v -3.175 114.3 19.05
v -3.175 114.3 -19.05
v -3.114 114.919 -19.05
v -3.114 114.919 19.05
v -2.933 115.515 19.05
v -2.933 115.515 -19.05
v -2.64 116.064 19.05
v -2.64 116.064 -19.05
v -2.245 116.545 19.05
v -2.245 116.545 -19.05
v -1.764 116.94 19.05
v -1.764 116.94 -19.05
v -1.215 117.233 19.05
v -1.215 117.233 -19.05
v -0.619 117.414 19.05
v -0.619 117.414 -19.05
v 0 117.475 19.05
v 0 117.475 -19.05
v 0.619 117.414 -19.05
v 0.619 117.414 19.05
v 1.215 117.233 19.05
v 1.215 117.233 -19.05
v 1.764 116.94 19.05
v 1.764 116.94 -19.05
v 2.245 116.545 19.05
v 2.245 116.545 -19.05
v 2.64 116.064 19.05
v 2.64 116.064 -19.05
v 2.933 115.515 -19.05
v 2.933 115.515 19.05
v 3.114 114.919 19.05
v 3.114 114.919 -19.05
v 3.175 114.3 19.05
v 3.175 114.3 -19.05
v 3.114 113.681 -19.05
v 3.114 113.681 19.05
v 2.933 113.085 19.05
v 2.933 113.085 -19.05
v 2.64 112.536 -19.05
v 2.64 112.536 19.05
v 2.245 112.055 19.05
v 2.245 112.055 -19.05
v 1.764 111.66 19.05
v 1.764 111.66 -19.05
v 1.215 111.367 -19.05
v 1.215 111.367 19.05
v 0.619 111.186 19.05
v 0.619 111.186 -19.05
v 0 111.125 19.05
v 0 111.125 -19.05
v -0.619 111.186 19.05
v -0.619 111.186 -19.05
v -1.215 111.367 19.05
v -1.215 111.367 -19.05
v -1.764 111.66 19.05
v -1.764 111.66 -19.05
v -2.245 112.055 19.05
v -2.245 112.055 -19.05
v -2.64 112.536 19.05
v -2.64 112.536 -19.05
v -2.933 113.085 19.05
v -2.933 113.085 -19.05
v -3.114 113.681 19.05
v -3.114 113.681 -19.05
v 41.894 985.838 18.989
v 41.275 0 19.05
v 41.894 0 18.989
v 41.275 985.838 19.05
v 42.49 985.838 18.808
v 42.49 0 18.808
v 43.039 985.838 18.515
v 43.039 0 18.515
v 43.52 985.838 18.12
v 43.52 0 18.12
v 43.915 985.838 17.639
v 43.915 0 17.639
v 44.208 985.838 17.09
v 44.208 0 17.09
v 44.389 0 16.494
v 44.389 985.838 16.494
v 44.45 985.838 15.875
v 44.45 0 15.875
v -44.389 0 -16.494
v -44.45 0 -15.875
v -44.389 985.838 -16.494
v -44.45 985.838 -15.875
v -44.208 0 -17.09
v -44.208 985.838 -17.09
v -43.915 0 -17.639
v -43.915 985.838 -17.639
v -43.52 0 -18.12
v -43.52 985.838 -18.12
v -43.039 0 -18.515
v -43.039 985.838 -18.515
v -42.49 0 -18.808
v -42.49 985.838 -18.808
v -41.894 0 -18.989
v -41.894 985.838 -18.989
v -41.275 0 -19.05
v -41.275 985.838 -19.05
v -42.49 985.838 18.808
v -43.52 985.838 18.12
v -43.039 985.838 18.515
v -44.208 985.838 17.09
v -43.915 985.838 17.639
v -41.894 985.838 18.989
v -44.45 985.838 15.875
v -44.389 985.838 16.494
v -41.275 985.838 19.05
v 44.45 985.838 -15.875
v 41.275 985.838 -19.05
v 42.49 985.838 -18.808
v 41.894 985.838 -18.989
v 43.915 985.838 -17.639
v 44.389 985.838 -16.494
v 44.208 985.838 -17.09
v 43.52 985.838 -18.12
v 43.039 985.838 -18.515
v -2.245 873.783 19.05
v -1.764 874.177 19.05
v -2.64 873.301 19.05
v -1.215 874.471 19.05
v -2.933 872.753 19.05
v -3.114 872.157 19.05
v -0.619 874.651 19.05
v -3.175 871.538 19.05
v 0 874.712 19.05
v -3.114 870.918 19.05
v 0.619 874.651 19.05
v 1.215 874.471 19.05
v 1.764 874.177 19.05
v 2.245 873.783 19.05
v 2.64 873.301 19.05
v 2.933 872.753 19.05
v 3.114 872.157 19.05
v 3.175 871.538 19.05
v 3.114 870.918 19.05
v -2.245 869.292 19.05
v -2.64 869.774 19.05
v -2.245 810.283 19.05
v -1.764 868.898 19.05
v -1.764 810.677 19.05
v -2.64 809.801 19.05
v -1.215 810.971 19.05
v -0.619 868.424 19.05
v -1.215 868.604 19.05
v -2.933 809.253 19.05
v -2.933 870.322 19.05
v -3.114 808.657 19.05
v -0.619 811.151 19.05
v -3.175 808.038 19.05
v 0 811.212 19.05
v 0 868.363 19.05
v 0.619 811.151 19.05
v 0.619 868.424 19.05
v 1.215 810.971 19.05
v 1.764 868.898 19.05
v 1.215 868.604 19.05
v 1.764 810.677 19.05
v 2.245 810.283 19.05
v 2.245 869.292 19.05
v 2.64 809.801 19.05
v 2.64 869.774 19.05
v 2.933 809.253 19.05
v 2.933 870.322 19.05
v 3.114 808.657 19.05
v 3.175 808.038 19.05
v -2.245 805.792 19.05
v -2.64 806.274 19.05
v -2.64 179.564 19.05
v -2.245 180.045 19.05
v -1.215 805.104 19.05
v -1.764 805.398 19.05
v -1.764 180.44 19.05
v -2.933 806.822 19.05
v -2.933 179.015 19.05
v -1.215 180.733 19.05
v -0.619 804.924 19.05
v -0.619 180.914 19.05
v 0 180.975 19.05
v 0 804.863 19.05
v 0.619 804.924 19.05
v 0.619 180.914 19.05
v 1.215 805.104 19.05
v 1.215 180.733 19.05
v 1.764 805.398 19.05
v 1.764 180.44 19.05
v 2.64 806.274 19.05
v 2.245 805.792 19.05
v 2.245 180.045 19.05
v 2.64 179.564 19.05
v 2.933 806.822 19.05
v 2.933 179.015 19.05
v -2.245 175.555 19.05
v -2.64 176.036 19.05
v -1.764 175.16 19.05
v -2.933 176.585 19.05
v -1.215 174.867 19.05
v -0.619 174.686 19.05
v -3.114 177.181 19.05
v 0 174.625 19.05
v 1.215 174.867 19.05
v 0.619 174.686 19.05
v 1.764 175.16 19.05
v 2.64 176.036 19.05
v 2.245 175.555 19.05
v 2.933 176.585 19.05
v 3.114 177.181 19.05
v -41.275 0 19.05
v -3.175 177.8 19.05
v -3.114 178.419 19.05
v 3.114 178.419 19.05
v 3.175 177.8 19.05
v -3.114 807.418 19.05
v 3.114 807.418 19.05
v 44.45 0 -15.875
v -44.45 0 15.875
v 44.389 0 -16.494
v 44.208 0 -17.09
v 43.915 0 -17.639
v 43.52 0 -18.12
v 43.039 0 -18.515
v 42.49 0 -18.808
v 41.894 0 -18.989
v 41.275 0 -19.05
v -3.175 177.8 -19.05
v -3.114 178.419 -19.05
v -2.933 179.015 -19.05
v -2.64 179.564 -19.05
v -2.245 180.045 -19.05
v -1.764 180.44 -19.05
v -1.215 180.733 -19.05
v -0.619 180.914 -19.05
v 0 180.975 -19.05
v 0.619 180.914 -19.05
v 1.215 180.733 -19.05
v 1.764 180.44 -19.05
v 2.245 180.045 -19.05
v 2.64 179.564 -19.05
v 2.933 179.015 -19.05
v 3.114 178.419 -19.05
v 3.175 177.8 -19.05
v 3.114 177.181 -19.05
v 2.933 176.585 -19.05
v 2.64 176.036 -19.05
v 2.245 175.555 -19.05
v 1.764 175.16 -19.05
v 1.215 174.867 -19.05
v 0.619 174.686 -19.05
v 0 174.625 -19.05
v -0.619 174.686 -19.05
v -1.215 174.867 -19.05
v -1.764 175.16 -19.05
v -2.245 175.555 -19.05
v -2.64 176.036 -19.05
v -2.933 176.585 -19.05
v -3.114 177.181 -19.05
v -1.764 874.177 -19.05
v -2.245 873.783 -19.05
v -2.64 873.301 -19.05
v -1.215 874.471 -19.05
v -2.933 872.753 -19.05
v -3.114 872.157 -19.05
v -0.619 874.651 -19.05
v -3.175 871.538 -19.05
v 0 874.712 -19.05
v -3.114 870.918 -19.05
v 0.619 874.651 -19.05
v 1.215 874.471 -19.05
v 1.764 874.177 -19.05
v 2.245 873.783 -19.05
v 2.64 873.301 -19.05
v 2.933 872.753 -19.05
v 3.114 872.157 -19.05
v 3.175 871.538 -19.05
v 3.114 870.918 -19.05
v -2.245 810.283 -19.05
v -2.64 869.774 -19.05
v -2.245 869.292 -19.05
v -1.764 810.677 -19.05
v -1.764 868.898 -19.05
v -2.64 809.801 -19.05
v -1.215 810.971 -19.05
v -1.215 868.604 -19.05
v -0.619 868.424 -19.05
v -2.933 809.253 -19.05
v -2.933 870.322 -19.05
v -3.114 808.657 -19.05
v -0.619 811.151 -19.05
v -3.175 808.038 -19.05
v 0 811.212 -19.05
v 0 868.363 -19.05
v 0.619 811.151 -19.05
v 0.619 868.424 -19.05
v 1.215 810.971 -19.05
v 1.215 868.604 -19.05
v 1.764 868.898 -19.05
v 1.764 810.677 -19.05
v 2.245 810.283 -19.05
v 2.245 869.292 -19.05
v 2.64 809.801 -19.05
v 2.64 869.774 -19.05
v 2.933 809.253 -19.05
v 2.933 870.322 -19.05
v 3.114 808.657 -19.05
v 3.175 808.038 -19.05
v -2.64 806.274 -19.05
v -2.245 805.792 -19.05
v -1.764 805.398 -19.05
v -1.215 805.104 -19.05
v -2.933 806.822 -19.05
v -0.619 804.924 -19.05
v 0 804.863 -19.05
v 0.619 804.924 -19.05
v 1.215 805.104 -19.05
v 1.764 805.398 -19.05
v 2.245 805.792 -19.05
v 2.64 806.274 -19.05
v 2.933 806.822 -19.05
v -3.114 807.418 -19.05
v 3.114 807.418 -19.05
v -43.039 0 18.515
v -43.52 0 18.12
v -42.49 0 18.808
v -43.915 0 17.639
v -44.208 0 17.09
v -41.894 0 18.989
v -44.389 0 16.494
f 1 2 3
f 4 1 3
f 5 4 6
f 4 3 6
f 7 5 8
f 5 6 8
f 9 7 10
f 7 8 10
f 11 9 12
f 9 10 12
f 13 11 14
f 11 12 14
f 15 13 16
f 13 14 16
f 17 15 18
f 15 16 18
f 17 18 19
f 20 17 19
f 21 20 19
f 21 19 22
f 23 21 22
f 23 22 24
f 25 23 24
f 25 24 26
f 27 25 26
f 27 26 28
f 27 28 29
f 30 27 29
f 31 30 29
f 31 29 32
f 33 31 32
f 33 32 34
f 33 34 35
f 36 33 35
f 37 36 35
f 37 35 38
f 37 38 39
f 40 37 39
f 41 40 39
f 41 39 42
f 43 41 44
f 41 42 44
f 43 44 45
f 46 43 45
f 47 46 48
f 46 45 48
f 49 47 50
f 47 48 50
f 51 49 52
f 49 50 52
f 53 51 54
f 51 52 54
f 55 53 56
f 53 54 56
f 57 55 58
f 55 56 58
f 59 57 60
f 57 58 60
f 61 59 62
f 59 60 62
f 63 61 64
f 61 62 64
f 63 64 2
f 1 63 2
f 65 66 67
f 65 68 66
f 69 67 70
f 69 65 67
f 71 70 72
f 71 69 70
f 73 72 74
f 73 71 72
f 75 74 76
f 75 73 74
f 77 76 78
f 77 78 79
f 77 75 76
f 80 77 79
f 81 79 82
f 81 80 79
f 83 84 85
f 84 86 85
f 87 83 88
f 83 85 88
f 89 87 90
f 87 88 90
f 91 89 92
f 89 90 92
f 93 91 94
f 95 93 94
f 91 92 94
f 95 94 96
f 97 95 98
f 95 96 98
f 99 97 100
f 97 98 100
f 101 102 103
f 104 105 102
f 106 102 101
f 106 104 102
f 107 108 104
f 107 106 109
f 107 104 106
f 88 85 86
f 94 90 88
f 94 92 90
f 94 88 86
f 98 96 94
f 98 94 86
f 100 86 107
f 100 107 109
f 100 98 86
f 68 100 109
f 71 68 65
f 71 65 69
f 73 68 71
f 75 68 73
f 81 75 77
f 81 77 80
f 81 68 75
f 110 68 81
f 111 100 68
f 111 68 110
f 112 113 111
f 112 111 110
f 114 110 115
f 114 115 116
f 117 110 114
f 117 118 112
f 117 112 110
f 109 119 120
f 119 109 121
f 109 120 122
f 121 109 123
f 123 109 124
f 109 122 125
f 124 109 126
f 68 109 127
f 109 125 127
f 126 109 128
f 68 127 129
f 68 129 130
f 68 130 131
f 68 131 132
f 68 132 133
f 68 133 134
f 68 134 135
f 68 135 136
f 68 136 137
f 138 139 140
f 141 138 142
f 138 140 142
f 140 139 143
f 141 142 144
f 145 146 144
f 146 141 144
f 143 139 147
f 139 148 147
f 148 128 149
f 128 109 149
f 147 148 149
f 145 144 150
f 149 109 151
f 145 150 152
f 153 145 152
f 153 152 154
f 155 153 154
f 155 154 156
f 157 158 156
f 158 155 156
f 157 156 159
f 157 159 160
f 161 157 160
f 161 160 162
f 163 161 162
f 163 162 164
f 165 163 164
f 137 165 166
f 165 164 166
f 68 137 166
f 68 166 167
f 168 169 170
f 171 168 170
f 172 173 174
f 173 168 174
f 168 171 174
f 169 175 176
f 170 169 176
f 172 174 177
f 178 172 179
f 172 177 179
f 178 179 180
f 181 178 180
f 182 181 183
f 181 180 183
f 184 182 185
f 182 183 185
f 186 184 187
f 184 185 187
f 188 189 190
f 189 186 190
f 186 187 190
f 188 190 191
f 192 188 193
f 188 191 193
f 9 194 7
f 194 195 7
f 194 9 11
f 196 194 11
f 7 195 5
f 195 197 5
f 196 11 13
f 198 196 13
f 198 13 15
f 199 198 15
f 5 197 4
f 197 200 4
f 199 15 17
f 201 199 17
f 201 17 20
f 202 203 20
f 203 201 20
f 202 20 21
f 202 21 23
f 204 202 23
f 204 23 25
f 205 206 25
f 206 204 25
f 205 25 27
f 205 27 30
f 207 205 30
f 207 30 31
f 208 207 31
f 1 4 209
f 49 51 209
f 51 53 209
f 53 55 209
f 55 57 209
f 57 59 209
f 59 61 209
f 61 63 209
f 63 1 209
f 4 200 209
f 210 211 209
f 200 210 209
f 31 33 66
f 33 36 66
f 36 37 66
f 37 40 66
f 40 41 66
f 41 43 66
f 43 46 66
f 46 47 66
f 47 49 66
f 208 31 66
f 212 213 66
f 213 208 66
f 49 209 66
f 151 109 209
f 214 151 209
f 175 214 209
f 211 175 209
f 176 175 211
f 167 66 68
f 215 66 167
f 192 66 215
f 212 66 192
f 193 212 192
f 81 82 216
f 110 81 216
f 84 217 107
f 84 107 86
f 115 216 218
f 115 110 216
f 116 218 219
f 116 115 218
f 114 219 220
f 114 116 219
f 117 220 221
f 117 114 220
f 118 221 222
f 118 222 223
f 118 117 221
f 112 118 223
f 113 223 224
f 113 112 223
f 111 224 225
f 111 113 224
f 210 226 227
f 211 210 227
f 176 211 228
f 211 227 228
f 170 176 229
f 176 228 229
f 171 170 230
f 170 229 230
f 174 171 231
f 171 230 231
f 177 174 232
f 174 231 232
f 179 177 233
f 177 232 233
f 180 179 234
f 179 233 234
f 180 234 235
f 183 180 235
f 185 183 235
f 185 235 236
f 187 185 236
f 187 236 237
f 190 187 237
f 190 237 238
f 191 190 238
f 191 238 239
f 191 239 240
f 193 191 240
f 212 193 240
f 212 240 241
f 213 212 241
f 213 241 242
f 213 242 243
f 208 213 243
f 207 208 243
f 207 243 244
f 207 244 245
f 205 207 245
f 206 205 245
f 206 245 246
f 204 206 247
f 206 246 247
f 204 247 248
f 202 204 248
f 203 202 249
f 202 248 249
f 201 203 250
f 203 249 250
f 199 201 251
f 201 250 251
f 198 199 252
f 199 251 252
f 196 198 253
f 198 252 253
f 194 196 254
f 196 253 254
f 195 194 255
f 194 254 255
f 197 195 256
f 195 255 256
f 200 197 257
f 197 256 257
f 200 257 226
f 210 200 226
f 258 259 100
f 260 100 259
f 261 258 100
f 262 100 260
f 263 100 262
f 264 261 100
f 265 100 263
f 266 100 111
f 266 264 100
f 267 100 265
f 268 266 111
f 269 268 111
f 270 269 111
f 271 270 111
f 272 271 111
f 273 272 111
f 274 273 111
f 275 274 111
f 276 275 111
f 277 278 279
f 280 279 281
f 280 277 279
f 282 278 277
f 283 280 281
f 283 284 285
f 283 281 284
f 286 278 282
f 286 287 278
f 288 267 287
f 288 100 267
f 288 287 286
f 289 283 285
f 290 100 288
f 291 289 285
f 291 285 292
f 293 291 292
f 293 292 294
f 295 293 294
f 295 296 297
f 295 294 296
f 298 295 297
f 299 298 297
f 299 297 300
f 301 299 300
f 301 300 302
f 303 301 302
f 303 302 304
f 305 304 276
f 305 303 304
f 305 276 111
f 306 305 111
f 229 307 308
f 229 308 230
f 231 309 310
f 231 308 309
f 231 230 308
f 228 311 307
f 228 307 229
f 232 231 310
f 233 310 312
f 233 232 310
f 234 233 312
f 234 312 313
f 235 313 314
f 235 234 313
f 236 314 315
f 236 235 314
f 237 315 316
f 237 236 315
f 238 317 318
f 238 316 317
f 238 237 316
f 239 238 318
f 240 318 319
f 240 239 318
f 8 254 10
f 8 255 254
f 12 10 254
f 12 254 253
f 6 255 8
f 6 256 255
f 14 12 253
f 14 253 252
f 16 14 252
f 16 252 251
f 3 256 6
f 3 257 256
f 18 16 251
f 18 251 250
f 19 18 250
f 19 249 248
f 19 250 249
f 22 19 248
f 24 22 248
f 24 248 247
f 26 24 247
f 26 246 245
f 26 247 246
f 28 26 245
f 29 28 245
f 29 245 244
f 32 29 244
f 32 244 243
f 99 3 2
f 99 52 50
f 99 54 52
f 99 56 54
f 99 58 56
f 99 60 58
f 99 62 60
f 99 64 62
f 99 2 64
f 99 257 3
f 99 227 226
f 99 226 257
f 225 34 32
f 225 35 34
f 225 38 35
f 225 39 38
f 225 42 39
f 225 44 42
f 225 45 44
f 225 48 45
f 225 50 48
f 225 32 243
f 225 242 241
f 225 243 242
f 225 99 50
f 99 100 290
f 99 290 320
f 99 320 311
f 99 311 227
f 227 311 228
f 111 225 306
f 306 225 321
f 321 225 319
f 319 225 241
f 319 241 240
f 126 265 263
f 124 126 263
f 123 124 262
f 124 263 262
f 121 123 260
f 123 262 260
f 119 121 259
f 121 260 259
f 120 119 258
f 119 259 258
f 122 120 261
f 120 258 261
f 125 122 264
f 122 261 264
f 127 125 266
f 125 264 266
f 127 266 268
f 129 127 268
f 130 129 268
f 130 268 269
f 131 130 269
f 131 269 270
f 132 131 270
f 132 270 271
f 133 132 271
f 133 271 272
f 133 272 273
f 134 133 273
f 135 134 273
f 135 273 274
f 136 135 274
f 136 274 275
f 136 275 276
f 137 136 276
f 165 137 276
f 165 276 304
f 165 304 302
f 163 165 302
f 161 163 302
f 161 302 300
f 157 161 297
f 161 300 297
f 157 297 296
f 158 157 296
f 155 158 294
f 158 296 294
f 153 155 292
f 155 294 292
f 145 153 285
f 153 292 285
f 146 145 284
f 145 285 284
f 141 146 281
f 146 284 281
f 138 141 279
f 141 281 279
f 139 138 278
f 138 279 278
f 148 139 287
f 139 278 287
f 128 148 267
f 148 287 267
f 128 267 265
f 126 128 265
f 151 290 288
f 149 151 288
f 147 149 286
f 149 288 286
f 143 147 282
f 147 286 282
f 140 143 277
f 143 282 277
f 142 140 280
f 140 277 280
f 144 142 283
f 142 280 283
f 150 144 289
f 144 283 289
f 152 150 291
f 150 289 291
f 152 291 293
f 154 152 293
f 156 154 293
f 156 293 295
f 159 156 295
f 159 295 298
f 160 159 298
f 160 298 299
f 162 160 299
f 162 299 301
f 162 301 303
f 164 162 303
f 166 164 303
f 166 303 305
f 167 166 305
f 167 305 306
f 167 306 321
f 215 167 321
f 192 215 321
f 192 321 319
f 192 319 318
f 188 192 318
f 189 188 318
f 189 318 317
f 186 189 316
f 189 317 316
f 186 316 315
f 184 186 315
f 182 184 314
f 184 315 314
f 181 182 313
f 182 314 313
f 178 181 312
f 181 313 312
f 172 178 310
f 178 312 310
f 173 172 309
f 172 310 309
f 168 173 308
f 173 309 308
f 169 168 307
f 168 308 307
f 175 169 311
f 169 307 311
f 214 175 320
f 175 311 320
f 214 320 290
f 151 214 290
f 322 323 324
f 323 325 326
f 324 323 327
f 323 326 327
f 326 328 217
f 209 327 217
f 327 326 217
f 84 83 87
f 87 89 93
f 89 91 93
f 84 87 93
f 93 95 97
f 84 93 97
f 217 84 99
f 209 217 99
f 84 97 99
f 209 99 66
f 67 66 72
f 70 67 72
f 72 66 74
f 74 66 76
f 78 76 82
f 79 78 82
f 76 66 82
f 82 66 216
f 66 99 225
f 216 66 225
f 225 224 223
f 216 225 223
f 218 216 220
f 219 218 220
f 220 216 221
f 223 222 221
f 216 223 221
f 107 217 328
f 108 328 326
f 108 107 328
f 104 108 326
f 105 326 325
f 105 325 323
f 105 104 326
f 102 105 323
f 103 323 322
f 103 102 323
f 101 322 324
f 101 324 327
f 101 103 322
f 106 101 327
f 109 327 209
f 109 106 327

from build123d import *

# Parameters (mm, degrees)
SKETCH1_W                   = 88.9
SKETCH1_H                   = 38.1
BOSS_EXTRUDE1_DEPTH         = 985.8375
FILLET1_R                   = 3.175
F_1_4_0_25_DIAMETER_HOLE1_D = 6.35


with BuildPart() as part:
    # Sketch1 → Boss-Extrude1 (new body)
    with BuildSketch(Plane(origin=(0, 0, 0), x_dir=(1, 0, 0), z_dir=(0, 1, 0))):
        Rectangle(SKETCH1_W, SKETCH1_H)
    extrude(amount=BOSS_EXTRUDE1_DEPTH)

    # Fillet1
    fillet1_edges = [part.edges().sort_by_distance(p)[0] for p in [
        (-44.45, 492.91875, -19.05),
        (44.45, 492.91875, -19.05),
        (44.45, 492.91875, 19.05),
        (-44.45, 492.91875, 19.05),
    ]]
    fillet(fillet1_edges, radius=FILLET1_R)

    # 1/4 (0.25) Diameter Hole1 (through all)
    with Locations(Plane.XY.offset(19.05)):
        with Locations((0, 114.3), (0, 177.8), (0, 808.0375), (0, 871.5375)):
            Hole(F_1_4_0_25_DIAMETER_HOLE1_D / 2)


solid = part.part
